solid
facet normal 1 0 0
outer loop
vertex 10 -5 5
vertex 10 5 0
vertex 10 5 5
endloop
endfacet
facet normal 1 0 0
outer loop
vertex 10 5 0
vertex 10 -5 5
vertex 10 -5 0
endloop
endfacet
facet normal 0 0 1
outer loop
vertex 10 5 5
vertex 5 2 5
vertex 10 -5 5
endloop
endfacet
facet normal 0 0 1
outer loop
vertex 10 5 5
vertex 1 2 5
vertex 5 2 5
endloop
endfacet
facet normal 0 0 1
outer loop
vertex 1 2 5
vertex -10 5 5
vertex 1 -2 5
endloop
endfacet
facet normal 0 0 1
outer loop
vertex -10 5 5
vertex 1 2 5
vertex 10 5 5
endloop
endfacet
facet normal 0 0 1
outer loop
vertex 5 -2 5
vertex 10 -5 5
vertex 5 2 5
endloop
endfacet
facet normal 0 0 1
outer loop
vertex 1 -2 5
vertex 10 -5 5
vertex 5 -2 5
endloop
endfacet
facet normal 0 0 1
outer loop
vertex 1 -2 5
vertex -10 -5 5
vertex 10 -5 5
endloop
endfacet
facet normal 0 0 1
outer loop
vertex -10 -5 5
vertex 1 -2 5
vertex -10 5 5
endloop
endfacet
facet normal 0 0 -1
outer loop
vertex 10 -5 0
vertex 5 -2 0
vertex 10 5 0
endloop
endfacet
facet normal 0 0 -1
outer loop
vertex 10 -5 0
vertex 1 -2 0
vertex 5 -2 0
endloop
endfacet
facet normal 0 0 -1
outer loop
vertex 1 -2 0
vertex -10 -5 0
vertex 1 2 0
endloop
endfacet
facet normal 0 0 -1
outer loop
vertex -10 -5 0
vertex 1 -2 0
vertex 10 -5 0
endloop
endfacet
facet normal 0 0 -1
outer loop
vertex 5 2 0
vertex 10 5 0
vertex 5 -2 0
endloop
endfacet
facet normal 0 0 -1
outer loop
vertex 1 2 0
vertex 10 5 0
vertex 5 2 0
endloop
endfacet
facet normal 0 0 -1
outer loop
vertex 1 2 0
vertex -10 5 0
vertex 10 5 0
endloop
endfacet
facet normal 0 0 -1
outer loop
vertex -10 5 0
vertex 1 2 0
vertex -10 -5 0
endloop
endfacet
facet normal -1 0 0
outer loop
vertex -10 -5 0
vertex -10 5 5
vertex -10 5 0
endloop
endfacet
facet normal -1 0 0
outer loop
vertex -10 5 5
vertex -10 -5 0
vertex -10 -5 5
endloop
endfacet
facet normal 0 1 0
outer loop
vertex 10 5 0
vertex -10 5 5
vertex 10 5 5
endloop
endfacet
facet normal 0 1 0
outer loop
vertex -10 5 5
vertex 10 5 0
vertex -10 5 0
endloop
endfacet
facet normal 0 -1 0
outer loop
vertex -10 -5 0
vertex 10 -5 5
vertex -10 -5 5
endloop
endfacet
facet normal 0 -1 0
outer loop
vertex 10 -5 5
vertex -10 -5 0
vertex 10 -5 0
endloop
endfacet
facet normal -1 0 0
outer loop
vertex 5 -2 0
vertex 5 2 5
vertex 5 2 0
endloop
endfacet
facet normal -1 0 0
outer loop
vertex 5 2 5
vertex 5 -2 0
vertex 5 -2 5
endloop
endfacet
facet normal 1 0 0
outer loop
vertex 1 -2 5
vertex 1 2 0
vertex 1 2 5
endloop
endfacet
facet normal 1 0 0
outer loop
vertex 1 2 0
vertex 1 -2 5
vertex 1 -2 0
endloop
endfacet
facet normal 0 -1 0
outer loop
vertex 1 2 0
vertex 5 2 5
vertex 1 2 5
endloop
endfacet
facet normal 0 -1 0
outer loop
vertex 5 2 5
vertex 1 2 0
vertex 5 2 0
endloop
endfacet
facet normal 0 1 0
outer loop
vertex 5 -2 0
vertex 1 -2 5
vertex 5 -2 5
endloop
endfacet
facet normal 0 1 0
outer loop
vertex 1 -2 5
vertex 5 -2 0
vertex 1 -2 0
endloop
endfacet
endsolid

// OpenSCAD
// A block with a square hole through it: planar faces only, so every mesher encloses the same volume.
width = 20;
depth = 10;
height = 5;
hole = 4;

difference() {
  translate([-width / 2, -depth / 2, 0]) cube([width, depth, height]);
  translate([3 - hole / 2, -hole / 2, -height]) cube([hole, hole, height * 3]);
}
